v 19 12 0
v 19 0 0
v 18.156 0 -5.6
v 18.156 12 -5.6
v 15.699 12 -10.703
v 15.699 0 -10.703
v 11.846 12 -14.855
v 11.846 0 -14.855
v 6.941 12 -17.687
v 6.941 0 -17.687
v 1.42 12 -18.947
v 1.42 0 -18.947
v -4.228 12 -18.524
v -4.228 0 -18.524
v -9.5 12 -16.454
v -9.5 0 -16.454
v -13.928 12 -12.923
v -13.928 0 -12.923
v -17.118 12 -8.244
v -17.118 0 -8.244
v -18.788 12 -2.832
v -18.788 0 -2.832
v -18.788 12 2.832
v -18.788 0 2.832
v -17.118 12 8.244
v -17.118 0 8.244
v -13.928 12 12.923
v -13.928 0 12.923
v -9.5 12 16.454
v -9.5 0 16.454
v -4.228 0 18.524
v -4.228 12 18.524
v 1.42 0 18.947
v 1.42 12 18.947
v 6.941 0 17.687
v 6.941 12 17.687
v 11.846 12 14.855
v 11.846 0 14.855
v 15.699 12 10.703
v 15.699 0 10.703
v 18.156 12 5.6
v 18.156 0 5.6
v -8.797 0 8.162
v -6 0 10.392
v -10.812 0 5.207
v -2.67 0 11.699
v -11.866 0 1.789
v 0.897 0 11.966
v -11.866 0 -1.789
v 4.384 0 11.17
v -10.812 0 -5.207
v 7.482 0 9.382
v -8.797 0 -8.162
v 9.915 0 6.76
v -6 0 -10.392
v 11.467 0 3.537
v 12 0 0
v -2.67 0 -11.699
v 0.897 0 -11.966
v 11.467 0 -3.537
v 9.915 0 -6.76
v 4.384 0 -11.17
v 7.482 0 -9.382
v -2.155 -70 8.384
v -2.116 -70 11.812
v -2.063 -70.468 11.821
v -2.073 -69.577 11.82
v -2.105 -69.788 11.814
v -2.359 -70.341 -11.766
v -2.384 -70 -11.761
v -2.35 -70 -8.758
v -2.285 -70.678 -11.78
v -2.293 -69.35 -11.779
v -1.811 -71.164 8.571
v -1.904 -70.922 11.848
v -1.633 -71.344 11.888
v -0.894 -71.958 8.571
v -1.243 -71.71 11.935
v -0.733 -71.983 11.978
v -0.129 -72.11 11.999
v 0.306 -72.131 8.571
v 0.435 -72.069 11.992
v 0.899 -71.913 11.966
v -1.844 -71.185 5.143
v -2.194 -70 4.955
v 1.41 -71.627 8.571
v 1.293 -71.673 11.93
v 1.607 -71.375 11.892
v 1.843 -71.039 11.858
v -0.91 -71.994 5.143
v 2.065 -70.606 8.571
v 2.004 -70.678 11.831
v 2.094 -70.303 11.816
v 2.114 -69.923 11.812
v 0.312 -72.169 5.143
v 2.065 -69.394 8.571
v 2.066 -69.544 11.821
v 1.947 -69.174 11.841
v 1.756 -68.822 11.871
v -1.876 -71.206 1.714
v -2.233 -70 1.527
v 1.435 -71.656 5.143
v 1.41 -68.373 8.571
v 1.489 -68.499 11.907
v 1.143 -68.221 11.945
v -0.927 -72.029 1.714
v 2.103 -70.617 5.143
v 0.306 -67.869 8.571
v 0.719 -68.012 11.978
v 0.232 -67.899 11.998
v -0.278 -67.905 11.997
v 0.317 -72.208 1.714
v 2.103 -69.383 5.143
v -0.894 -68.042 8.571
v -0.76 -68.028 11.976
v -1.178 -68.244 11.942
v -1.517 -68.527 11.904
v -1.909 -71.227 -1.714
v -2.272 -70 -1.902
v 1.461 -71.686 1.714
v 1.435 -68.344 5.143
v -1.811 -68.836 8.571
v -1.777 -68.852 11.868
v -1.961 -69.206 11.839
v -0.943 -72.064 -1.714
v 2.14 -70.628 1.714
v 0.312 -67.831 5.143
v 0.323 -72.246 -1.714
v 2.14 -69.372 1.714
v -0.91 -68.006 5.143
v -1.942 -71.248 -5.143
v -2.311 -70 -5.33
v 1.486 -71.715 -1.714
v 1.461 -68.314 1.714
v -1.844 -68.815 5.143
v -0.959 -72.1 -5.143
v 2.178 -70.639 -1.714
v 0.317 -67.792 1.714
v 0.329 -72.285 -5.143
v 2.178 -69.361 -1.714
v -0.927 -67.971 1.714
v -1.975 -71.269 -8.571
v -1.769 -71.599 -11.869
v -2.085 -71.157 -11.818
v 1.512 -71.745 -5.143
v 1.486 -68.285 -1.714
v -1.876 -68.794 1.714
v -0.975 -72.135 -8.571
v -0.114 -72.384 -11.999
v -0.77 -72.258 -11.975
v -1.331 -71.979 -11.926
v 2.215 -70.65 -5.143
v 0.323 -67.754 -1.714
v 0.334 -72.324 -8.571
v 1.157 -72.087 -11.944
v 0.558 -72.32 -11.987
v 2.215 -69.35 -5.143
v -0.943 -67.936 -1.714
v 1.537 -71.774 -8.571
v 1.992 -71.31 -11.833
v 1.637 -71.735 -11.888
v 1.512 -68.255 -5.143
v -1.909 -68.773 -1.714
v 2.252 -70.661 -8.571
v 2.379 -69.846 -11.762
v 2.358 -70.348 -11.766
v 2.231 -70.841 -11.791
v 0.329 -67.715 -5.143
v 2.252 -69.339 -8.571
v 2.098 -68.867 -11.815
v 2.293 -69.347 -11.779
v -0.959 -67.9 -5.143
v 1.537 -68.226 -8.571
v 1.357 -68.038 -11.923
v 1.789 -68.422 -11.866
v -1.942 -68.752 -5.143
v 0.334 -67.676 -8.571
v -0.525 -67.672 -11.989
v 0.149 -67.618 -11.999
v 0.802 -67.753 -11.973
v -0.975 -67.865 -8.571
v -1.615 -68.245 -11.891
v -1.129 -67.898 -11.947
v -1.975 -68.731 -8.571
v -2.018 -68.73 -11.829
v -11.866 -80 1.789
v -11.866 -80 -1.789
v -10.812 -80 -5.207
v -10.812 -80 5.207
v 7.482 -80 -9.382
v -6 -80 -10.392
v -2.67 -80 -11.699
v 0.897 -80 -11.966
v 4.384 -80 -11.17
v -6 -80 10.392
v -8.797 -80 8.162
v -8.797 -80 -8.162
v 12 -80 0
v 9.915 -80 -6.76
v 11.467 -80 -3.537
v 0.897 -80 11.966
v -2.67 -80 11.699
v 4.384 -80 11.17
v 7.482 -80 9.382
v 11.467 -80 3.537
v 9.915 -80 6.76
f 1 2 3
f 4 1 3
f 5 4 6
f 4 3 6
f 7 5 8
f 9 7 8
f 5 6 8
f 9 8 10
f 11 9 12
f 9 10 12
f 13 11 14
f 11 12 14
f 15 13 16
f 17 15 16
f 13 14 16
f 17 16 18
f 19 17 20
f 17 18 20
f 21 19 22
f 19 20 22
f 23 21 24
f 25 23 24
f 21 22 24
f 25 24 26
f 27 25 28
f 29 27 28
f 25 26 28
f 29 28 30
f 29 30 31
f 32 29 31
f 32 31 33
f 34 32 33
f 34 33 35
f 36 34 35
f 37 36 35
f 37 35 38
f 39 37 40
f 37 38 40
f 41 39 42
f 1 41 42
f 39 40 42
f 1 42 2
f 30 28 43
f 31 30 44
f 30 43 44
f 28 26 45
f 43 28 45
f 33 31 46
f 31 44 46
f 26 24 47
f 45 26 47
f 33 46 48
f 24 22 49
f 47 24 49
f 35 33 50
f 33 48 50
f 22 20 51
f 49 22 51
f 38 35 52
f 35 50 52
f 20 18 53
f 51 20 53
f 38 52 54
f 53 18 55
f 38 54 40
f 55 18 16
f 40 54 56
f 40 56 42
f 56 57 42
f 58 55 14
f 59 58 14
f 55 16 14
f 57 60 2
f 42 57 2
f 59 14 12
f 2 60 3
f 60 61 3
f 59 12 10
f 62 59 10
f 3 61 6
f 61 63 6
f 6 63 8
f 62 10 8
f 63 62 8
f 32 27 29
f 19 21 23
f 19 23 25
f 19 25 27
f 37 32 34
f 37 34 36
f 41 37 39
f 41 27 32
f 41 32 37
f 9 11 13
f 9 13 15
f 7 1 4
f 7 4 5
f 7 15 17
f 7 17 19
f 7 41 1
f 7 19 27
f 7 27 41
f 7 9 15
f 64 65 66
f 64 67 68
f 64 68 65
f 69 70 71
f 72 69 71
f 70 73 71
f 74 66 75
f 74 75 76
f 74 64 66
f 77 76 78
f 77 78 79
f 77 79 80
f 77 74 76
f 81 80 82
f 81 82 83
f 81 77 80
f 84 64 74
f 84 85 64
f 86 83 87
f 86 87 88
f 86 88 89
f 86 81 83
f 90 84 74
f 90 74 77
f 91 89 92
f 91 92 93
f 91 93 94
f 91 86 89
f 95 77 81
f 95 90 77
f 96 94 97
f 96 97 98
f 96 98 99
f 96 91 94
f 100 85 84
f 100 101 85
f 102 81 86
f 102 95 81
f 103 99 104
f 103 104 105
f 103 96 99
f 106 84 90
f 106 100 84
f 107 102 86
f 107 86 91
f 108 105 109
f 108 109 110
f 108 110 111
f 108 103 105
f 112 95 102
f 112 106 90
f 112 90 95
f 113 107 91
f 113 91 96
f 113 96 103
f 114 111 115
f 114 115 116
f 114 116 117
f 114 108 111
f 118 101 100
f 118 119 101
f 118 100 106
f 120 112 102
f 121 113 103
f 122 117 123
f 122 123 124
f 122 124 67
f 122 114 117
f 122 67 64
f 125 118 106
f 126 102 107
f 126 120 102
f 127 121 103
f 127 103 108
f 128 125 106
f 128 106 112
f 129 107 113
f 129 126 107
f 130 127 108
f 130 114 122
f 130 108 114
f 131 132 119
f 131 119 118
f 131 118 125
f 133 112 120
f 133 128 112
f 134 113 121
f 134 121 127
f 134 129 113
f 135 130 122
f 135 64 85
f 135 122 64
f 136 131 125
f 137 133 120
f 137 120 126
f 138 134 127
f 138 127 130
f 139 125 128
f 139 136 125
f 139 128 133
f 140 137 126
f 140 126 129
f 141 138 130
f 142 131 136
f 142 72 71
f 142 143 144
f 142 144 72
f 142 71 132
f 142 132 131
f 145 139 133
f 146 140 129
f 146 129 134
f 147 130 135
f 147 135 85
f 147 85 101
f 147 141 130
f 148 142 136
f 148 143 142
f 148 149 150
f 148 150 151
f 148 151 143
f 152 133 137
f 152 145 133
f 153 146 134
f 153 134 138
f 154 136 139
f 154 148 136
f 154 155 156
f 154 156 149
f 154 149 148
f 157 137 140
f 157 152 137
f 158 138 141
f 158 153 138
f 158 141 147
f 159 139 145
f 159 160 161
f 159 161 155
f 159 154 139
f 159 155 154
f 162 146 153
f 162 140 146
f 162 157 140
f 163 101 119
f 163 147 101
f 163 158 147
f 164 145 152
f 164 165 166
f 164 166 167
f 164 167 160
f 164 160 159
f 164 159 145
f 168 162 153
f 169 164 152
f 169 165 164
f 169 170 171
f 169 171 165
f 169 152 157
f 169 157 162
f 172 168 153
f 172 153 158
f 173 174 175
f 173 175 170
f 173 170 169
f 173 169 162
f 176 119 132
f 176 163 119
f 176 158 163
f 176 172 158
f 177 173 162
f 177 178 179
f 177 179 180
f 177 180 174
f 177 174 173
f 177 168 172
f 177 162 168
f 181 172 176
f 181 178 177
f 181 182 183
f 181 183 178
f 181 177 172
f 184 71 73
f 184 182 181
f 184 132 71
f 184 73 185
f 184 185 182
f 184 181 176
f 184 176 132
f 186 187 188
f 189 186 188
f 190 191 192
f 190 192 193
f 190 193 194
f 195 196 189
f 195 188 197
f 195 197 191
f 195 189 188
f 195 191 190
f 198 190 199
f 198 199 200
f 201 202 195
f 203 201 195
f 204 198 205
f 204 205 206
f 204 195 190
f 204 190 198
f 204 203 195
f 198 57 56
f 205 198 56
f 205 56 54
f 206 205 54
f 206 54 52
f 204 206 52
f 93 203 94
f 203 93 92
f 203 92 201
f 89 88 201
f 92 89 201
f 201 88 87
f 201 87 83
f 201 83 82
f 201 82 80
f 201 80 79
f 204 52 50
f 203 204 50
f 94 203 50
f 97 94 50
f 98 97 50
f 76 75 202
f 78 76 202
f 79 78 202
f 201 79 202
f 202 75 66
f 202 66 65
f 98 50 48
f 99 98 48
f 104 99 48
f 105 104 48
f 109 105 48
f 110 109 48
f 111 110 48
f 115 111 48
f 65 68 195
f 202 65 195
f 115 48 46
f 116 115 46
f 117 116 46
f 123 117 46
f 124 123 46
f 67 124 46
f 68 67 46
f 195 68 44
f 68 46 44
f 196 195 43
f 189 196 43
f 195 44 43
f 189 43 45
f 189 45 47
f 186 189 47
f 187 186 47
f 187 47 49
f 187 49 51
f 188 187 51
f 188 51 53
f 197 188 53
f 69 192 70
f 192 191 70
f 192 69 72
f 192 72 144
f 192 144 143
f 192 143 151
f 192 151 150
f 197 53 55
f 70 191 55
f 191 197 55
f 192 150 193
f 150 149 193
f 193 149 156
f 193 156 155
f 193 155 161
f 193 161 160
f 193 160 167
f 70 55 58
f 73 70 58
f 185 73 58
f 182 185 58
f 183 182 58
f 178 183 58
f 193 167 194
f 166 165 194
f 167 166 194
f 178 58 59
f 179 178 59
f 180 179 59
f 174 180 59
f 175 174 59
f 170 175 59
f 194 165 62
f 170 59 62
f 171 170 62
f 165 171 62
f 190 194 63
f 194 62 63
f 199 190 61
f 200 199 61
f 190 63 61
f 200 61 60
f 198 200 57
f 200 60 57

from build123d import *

# Parameters (mm, degrees)
SKETCH1_R           = 19
BOSS_EXTRUDE1_DEPTH = 12
SKETCH2_R           = 12
BOSS_EXTRUDE2_DEPTH = 80


with BuildPart() as part:
    # Sketch1 → Boss-Extrude1 (new body)
    with BuildSketch(Plane(origin=(0, 0, 0), x_dir=(1, 0, 0), z_dir=(0, 1, 0))):
        Circle(SKETCH1_R)
    extrude(amount=BOSS_EXTRUDE1_DEPTH)

    # Sketch2 → Boss-Extrude2 (add)
    with BuildSketch(Plane.XZ):
        Circle(SKETCH2_R)
    extrude(amount=BOSS_EXTRUDE2_DEPTH)

    # Sketch3 → Cut-Revolve1 (revolve, cut)
    with BuildSketch(Plane(origin=(0, -70, 0), x_dir=(-1, 0, 0), z_dir=(0, -1, 0))):
        Polygon((0, 22), (0, -22), (2, -22), (2.5, 22), align=None)
    revolve(axis=Axis((0, -70, -23.746840194), (0, 0, 1)), mode=Mode.SUBTRACT)


solid = part.part
